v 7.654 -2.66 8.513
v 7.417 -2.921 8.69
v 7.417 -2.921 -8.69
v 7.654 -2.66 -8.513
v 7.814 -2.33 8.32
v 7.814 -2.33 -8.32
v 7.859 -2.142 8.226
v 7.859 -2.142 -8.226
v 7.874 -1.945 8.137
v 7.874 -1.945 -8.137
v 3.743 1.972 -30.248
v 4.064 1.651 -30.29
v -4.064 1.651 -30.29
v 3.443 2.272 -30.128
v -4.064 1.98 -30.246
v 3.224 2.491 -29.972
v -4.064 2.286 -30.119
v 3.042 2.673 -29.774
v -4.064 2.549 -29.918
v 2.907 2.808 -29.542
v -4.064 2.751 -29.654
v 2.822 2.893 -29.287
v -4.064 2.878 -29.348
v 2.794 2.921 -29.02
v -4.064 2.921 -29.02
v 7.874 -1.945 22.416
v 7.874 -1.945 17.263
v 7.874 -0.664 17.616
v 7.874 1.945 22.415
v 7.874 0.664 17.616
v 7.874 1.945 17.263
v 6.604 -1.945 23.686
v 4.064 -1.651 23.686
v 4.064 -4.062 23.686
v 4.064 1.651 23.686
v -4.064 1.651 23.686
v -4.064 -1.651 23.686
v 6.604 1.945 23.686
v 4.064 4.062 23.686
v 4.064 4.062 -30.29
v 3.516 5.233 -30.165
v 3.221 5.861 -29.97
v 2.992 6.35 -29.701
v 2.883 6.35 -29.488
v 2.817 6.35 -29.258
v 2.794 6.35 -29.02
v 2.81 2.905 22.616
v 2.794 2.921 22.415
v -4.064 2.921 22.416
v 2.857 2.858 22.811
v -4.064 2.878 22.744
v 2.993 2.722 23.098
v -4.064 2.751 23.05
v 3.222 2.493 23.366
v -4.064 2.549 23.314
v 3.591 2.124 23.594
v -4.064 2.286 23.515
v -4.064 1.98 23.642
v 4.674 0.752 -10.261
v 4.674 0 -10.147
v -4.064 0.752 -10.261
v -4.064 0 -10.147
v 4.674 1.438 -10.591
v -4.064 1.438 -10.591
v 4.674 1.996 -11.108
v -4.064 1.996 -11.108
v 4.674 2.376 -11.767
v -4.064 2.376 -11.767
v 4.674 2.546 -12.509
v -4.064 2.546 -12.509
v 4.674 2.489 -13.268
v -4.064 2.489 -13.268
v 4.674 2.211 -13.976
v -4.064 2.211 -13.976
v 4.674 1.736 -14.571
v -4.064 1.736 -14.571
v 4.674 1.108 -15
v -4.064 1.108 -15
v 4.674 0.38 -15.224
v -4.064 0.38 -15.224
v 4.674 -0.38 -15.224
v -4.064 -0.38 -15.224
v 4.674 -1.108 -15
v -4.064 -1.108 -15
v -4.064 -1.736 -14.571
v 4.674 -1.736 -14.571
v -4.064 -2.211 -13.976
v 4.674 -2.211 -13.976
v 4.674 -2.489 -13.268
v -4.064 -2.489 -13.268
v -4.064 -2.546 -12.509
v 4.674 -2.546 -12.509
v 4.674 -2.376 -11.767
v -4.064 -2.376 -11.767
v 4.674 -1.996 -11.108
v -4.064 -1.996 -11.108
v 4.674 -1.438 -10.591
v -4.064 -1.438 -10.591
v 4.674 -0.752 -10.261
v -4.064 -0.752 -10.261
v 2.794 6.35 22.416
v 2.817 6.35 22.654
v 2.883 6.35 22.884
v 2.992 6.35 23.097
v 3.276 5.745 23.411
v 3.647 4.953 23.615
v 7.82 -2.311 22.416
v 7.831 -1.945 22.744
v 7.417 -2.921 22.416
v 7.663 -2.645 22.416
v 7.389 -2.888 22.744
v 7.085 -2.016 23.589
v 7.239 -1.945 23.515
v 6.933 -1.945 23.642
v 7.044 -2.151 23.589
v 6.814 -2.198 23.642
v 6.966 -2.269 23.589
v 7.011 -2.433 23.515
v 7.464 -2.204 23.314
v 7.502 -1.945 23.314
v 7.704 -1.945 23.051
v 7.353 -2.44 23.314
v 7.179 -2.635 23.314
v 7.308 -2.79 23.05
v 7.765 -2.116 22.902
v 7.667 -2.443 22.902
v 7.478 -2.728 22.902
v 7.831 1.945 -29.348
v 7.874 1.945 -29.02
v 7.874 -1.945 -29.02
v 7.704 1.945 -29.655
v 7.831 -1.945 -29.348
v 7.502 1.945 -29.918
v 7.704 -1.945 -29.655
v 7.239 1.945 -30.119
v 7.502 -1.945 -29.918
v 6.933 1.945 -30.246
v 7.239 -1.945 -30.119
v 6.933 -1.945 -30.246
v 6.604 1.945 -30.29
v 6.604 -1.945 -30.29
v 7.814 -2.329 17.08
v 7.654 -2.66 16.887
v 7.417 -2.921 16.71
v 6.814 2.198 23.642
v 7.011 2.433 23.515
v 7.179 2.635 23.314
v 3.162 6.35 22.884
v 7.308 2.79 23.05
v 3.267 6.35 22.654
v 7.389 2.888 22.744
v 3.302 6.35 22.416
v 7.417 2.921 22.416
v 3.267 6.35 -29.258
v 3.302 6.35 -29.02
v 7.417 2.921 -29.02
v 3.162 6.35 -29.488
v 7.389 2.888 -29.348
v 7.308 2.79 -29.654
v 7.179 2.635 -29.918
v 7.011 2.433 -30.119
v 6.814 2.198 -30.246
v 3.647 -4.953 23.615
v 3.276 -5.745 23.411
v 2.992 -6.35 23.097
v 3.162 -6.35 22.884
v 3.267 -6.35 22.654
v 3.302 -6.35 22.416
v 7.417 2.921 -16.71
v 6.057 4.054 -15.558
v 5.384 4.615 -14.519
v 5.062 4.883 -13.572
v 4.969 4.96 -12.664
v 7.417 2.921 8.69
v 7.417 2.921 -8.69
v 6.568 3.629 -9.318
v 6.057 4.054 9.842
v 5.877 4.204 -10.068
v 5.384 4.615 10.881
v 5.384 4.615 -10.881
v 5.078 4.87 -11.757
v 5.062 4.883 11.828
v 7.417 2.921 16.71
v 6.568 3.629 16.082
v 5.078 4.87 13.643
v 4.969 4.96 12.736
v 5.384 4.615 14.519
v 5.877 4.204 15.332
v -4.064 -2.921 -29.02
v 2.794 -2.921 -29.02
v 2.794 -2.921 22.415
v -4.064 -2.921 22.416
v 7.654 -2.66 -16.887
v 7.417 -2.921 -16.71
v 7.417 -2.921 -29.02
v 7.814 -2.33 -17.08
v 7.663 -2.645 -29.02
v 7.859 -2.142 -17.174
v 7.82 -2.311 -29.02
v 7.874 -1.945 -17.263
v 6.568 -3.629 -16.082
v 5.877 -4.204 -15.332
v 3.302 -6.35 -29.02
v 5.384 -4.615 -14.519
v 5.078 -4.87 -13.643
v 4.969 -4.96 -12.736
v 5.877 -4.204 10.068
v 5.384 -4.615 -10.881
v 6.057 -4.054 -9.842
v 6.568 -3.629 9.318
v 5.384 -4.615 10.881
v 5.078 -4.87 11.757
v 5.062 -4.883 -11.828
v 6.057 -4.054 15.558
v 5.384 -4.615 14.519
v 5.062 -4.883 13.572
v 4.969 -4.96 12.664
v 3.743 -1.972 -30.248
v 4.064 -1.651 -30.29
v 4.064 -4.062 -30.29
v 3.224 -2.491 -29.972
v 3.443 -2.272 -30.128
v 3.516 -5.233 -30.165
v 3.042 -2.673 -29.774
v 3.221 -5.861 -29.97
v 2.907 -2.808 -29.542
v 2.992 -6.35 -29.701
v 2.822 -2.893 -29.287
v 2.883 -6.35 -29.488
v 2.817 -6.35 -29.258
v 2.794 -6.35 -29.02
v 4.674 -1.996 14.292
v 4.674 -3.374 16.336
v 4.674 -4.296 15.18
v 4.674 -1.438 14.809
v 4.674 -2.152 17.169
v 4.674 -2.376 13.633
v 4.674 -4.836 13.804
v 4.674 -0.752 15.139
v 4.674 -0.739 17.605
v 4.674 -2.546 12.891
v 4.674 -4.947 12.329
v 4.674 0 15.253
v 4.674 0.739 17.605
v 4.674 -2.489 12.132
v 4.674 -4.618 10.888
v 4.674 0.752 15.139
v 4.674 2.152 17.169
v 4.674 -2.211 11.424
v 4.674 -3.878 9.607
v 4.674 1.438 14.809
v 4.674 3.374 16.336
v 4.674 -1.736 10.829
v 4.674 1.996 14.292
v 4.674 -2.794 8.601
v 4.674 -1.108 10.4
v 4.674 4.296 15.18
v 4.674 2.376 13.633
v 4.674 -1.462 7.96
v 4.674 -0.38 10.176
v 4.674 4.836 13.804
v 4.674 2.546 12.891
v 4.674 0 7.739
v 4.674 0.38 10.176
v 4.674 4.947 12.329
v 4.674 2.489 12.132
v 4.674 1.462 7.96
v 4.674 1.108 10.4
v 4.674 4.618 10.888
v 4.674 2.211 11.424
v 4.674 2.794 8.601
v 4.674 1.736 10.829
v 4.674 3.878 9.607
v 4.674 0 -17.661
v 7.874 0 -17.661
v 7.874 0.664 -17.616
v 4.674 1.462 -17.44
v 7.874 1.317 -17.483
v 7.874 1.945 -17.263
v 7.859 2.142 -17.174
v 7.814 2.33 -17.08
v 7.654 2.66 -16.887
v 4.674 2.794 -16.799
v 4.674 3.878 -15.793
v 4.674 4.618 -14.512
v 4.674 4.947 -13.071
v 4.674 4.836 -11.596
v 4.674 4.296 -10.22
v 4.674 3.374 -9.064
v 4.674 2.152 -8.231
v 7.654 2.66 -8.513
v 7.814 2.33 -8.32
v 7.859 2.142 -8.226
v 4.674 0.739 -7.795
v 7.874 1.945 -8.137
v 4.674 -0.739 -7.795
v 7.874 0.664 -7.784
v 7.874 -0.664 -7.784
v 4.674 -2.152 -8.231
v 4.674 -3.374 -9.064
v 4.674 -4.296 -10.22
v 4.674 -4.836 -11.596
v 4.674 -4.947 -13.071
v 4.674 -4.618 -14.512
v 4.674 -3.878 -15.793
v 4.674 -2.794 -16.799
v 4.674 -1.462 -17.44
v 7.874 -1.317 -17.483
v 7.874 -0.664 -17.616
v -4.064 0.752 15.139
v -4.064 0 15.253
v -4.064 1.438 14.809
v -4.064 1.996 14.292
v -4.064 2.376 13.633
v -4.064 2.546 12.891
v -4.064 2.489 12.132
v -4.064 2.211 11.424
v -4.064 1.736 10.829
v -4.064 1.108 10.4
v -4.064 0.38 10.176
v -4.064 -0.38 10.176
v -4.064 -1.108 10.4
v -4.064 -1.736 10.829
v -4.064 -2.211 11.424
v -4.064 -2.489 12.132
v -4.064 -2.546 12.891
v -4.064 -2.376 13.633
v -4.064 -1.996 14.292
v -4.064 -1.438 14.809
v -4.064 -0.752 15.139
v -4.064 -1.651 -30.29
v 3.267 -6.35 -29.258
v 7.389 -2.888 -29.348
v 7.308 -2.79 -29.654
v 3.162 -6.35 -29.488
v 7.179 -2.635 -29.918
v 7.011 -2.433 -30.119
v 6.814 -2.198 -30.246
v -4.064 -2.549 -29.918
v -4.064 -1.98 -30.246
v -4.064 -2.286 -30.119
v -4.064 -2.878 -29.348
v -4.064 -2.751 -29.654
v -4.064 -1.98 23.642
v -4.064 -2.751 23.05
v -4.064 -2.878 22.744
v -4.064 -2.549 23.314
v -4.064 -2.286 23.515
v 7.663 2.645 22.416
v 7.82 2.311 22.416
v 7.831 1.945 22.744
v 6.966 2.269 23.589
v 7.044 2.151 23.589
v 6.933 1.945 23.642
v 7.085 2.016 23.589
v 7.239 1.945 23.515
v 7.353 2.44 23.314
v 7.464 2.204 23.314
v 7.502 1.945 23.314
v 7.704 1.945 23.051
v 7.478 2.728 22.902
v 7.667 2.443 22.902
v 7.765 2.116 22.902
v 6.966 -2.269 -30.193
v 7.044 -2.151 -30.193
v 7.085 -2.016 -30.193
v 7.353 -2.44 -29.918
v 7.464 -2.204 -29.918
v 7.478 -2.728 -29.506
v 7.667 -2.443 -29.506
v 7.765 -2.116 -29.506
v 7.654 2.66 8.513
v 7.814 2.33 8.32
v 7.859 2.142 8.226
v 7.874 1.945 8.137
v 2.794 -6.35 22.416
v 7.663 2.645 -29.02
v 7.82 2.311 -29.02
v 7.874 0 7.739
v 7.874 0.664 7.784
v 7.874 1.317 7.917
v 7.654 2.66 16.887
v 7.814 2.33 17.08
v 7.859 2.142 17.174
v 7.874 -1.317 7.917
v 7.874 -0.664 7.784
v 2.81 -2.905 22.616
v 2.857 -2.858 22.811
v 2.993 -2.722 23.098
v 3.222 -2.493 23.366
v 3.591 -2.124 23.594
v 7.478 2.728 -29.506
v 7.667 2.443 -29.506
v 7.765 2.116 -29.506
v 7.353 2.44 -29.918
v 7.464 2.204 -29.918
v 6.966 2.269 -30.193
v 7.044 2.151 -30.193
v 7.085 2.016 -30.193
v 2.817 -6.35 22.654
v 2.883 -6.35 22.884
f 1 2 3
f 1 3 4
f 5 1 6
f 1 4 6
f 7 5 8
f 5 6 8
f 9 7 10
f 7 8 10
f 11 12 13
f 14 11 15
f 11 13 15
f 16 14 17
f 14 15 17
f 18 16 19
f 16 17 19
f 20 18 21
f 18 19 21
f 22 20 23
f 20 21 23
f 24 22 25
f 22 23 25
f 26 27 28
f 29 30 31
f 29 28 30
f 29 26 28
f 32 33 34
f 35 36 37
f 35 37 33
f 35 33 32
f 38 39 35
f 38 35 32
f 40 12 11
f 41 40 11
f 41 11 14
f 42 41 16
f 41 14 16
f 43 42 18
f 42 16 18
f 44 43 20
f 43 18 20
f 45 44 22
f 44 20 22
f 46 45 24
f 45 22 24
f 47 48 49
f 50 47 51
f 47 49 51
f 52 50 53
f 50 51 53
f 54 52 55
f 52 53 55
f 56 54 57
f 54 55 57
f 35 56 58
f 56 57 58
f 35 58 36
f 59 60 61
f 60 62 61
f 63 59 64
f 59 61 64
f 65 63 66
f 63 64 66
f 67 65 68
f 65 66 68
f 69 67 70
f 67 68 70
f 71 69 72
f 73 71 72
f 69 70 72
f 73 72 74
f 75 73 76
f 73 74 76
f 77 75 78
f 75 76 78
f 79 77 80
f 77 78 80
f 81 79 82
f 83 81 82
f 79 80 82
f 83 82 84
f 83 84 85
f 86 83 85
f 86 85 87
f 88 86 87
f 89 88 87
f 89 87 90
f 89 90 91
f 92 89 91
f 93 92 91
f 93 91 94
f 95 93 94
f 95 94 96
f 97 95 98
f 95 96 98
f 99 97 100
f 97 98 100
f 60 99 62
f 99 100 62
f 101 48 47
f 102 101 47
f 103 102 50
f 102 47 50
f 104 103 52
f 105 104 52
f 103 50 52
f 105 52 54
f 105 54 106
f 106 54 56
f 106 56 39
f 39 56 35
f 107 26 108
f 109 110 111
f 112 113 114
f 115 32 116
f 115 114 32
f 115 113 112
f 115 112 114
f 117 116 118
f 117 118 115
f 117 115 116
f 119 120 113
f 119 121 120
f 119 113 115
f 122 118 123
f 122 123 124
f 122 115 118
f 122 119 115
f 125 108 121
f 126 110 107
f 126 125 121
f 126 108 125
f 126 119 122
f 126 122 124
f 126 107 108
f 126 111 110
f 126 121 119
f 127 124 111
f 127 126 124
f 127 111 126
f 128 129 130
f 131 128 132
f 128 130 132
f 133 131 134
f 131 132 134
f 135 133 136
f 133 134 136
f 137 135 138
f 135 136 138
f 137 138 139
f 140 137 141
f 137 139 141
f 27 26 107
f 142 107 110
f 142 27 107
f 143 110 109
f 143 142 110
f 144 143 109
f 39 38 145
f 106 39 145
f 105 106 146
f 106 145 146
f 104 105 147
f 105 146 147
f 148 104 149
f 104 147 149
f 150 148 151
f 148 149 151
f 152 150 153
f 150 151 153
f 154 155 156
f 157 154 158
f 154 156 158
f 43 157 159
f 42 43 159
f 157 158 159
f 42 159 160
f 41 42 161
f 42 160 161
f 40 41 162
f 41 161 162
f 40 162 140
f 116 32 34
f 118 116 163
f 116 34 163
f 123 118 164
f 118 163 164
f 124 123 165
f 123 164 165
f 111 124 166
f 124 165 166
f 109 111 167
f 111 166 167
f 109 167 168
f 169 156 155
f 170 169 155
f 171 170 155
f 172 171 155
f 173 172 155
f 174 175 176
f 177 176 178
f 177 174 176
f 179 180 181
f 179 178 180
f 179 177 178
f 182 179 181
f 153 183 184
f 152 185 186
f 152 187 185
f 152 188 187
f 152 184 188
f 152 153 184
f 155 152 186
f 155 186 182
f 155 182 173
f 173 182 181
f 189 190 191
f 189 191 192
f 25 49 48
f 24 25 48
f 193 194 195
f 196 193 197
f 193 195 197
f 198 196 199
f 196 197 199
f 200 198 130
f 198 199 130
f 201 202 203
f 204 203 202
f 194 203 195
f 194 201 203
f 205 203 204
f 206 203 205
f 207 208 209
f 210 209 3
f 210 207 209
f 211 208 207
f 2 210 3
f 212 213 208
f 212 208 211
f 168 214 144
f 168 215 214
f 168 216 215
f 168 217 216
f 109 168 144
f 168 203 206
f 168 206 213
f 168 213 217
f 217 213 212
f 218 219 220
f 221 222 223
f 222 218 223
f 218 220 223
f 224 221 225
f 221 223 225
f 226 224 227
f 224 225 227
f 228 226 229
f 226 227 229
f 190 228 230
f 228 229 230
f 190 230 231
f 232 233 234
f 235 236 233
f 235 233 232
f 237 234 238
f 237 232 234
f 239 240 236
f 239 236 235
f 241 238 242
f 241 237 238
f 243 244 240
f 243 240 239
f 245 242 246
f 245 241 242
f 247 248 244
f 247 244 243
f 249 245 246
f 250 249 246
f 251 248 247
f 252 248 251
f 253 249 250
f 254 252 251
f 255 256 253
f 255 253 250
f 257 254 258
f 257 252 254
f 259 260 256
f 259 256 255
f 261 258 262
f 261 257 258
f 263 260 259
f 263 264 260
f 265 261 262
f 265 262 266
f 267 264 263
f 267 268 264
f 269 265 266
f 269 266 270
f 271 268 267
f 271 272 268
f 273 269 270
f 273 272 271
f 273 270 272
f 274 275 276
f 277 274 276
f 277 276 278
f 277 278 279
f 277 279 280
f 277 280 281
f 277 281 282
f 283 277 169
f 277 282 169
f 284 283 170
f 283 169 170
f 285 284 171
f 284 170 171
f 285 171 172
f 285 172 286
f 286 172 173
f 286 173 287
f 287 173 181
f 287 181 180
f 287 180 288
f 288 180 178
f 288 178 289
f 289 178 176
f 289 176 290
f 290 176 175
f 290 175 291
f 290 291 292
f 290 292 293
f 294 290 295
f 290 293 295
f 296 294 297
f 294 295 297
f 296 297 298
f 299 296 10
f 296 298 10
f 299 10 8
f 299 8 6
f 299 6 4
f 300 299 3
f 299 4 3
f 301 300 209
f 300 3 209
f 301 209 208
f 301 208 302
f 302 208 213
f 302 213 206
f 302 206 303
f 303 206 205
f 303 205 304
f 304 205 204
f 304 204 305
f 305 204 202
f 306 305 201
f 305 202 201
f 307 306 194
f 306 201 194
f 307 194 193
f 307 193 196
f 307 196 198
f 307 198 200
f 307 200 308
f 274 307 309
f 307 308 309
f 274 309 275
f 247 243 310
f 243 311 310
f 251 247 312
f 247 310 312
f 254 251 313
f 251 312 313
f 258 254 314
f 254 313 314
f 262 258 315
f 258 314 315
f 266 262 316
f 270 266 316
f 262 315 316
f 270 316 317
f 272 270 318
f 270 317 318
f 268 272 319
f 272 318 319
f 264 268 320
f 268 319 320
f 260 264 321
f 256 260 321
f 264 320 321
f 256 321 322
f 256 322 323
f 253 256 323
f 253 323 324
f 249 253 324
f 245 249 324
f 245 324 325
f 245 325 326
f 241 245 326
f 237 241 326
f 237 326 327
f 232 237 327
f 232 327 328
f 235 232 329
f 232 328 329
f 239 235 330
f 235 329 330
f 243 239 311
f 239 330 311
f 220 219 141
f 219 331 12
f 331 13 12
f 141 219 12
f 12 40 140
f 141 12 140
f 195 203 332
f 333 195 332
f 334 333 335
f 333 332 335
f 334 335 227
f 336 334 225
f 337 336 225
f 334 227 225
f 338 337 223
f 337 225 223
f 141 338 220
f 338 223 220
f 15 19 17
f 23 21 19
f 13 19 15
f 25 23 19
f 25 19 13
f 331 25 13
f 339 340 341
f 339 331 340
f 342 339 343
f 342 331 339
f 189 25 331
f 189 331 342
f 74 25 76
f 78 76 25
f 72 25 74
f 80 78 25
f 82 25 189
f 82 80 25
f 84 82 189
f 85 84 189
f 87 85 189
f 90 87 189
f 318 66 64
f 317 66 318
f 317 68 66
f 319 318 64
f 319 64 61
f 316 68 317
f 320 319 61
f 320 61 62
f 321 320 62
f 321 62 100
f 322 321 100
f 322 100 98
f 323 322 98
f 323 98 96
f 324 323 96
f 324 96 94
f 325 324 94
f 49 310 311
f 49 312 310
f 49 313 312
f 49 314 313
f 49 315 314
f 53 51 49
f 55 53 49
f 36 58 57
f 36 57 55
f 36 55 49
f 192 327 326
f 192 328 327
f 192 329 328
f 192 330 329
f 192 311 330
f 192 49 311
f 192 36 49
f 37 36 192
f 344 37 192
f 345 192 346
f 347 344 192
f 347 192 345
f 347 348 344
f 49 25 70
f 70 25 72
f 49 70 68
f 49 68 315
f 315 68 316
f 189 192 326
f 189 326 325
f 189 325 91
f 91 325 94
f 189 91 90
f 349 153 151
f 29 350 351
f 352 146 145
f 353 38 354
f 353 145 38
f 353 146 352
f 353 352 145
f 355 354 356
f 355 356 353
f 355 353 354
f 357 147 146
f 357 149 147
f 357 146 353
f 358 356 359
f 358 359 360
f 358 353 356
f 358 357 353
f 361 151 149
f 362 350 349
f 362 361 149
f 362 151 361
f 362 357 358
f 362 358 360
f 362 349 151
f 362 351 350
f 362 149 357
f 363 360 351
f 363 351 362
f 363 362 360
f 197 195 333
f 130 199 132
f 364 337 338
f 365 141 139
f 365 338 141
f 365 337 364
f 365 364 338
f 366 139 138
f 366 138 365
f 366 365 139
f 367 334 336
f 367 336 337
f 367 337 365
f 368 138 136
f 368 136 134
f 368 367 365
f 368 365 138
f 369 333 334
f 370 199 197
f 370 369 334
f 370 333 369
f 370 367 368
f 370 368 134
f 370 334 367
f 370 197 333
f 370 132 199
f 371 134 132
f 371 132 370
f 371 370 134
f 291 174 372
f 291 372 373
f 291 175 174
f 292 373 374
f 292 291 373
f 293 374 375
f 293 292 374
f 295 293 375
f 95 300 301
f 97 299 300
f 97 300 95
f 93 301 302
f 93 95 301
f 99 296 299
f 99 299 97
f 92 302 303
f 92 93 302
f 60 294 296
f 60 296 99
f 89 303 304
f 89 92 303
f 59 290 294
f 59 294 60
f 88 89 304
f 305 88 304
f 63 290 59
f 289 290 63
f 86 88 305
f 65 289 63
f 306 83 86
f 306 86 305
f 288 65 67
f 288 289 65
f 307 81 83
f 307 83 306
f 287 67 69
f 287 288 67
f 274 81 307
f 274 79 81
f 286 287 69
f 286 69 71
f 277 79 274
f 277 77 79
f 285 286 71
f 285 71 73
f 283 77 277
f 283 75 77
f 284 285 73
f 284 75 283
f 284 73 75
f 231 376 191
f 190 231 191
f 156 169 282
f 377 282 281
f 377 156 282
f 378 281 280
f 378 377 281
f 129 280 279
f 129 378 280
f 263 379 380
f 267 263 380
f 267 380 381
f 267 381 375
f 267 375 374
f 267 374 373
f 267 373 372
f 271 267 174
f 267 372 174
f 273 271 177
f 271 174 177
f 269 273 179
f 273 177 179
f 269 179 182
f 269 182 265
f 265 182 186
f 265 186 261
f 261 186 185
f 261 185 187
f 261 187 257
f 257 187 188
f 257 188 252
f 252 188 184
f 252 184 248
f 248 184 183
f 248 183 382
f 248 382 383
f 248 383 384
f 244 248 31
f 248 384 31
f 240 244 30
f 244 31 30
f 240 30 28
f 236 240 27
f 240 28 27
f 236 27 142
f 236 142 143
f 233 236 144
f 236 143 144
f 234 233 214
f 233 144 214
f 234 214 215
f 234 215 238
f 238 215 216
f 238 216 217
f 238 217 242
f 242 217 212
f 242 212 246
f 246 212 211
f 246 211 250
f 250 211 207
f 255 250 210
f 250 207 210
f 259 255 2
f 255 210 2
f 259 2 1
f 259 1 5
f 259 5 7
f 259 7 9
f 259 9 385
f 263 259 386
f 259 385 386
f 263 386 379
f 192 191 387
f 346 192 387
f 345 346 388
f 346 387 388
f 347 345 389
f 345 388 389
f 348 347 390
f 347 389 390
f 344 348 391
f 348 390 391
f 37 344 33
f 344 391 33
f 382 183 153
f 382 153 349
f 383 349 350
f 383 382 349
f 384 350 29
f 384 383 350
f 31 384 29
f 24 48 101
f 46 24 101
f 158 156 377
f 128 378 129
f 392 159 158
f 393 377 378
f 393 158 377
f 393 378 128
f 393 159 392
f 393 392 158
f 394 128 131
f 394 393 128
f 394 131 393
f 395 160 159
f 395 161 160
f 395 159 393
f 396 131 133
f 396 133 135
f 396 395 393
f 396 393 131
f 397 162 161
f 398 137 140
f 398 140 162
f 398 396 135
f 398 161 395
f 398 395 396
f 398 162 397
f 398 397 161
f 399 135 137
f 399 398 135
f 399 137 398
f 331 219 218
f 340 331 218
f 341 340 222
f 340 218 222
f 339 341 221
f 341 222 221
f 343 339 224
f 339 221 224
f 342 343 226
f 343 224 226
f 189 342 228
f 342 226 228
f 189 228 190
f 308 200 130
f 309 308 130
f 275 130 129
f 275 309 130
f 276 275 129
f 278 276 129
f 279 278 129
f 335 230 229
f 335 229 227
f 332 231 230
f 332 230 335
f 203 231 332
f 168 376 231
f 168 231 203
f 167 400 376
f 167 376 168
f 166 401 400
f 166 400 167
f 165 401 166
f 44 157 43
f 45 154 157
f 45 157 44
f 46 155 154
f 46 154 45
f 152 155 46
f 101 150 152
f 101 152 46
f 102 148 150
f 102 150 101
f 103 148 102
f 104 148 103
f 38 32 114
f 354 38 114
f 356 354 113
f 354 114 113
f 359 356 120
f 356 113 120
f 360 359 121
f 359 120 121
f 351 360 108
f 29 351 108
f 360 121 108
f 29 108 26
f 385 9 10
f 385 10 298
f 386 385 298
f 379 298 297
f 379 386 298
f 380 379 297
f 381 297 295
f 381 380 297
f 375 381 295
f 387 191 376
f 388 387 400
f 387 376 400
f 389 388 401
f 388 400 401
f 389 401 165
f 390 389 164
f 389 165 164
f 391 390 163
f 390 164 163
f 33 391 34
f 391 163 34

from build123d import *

# Parameters (mm, degrees)
BOSS_EXTRUDE1_DEPTH                             = 53.975
SKETCH2_W                                       = 6.858
SKETCH2_H                                       = 3.429
CUT_EXTRUDE1_DEPTH                              = 55.91468839
SKETCH4_W                                       = 6.858
SKETCH4_H                                       = 3.429
CUT_EXTRUDE2_DEPTH                              = 55.91468839
F_3_CLEARANCE_HOLE1_D                           = 2.7686
CBORE_FOR_10_BUTTON_HEAD_CAP_SCREW1_D           = 5.1054
CBORE_FOR_10_BUTTON_HEAD_CAP_SCREW1_CBORE_D     = 9.92124
CBORE_FOR_10_BUTTON_HEAD_CAP_SCREW1_CBORE_DEPTH = 3.2004
FILLET1_R                                       = 1.27
FILLET3_R                                       = 1.27
FILLET5_R                                       = 1.27


with BuildPart() as part:
    # Sketch1 → Boss-Extrude1 (new body)
    with BuildSketch(Plane.XY.offset(23.6855)):
        Polygon((3.302, 6.35), (-4.064, 6.35), (-4.064, -6.35), (3.302, -6.35), (7.874, -2.54), (7.874, 2.54), align=None)
    extrude(amount=-BOSS_EXTRUDE1_DEPTH)

    # Sketch2 → Cut-Extrude1 (cut, through all)
    with BuildSketch(Plane.XY.offset(23.6855)):
        with Locations((-0.635, 4.6355)):
            Rectangle(SKETCH2_W, SKETCH2_H)
    extrude(amount=-CUT_EXTRUDE1_DEPTH, mode=Mode.SUBTRACT)

    # Sketch4 → Cut-Extrude2 (cut, through all)
    with BuildSketch(Plane.XY.offset(23.6855)):
        with Locations((-0.635, -4.6355)):
            Rectangle(SKETCH4_W, SKETCH4_H)
    extrude(amount=-CUT_EXTRUDE2_DEPTH, mode=Mode.SUBTRACT)

    # #3 Clearance Hole1 (through all)
    with Locations(Plane.ZY.offset(4.064)):
        with Locations((12.7, 0), (-12.7, 0)):
            Hole(F_3_CLEARANCE_HOLE1_D / 2)

    # CBORE for #10 Button Head Cap Screw1 (through all)
    with Locations(Plane(origin=(7.874, 0, 0), x_dir=(0, 0, -1), z_dir=(1, 0, 0))):
        with Locations((-12.7, 0), (12.7, 0)):
            CounterBoreHole(CBORE_FOR_10_BUTTON_HEAD_CAP_SCREW1_D / 2, CBORE_FOR_10_BUTTON_HEAD_CAP_SCREW1_CBORE_D / 2, CBORE_FOR_10_BUTTON_HEAD_CAP_SCREW1_CBORE_DEPTH)

    # Fillet1
    fillet1_edges = [part.edges().sort_by_distance(p)[0] for p in [
        (7.874, -2.54, 20.323251747),
        (7.874, -2.54, -23.625251747),
        (7.874, -2.54, 0),
        (7.874, 2.54, 20.323251747),
        (7.874, 2.54, 0),
        (7.874, 2.54, -23.625251747),
    ]]
    fillet(fillet1_edges, radius=FILLET1_R)

    # Fillet3
    # the kernel refuses this fillet: 1.27 mm, written as the material it takes off along each edge
    with BuildSketch(Plane(origin=(0.862897437, -8.382585469, -30.2895), x_dir=(0, 0, 1), z_dir=(0.7682212795973759, 0.6401843996644799, 0)), Plane(origin=(7.417034188, 2.920804844, -30.2895), x_dir=(0, 0, 1), z_dir=(-0.7682212795973759, 0.6401843996644799, 0))) as fillet3_piece_1:
        with BuildLine():
            CenterArc((FILLET3_R, -FILLET3_R), FILLET3_R, 90, 90)
            Line((0, -FILLET3_R), (0, 0))
            Line((0, 0), (FILLET3_R, 0))
        make_face()
    extrude(amount=8.531574072, mode=Mode.SUBTRACT)
    with BuildSketch(Plane(origin=(6.604, -1.945163819, -30.2895), x_dir=(0.6401843996644796, -0.7682212795973762, 0), z_dir=(-0.7682212795973762, -0.6401843996644796, 0))) as fillet3_piece_2:
        with BuildLine():
            CenterArc((1.27 - FILLET3_R, FILLET3_R), FILLET3_R, 270, 90)
            Line((1.27, FILLET3_R), (1.27, 0))
            Line((1.27, 0), (1.27 - FILLET3_R, 0))
        make_face()
    revolve(axis=Axis((6.604, -1.945163819, -30.2895), (0, 0, 1)), revolution_arc=50.194428908, mode=Mode.SUBTRACT)
    with BuildSketch(Plane(origin=(6.604, 1.945163819, -30.2895), x_dir=(0.6401843996644799, 0.7682212795973757, 0), z_dir=(-0.7682212795973757, 0.6401843996644799, 0))) as fillet3_piece_3:
        with BuildLine():
            CenterArc((1.27 - FILLET3_R, -FILLET3_R), FILLET3_R, 0, 90)
            Line((1.27, -FILLET3_R), (1.27, 0))
            Line((1.27, 0), (1.27 - FILLET3_R, 0))
        make_face()
    revolve(axis=Axis((6.604, 1.945163819, -30.2895), (0, 0, -1)), revolution_arc=50.194428908, mode=Mode.SUBTRACT)
    with BuildSketch(Plane(origin=(2.794, -2.921, -30.2895), x_dir=(0, 0, 1), z_dir=(-1, 0, 0)), Plane(origin=(-7.239, 2.921, -30.2895), x_dir=(0, 0, 1), z_dir=(1, 0, 0))) as fillet3_piece_4:
        with BuildLine():
            CenterArc((FILLET3_R, FILLET3_R), FILLET3_R, 180, 90)
            Line((0, FILLET3_R), (0, 0))
            Line((0, 0), (FILLET3_R, 0))
        make_face()
    extrude(amount=10.033, mode=Mode.SUBTRACT)
    with BuildSketch(Plane(origin=(2.794, 2.921, -30.2895), x_dir=(0, 0, 1), z_dir=(0, 1, 0)), Plane(origin=(2.794, -9.525, -30.2895), x_dir=(0, 0, 1), z_dir=(0, 1, 0))) as fillet3_piece_5:
        with BuildLine():
            CenterArc((FILLET3_R, FILLET3_R), FILLET3_R, 180, 90)
            Line((0, FILLET3_R), (0, 0))
            Line((0, 0), (FILLET3_R, 0))
        make_face()
    extrude(amount=6.604, mode=Mode.SUBTRACT)
    with BuildSketch(Plane(origin=(7.874, -1.945163819, -30.2895), x_dir=(-1, 0, 0), z_dir=(0, 1, 0))) as fillet3_piece_6:
        with BuildLine():
            CenterArc((FILLET3_R, FILLET3_R), FILLET3_R, 180, 90)
            Line((0, FILLET3_R), (0, 0))
            Line((0, 0), (FILLET3_R, 0))
        make_face()
    extrude(amount=3.890327637, mode=Mode.SUBTRACT)
    with BuildSketch(Plane(origin=(2.794, -9.525, -30.2895), x_dir=(0, 0, 1), z_dir=(0, 1, 0))) as fillet3_piece_7a_section:
        with BuildLine():
            CenterArc((FILLET3_R, FILLET3_R), FILLET3_R, 180, 90)
            Line((0, FILLET3_R), (0, 0))
            Line((0, 0), (FILLET3_R, 0))
        make_face()
    fillet3_piece_7a = extrude(amount=9.779, mode=Mode.PRIVATE)
    fillet3_piece_7a = split(fillet3_piece_7a, bisect_by=Plane(origin=(3.081521795, -2.921, -30.001978205), z_dir=(0, 1, 0)), keep=Keep.TOP, mode=Mode.PRIVATE)
    with BuildSketch(Plane(origin=(5.969, -2.921, -30.2895), x_dir=(0, 0, 1), z_dir=(-1, 0, 0))) as fillet3_piece_7b_section:
        with BuildLine():
            CenterArc((FILLET3_R, FILLET3_R), FILLET3_R, 180, 90)
            Line((0, FILLET3_R), (0, 0))
            Line((0, 0), (FILLET3_R, 0))
        make_face()
    fillet3_piece_7b = extrude(amount=13.208, mode=Mode.PRIVATE)
    fillet3_piece_7b = split(fillet3_piece_7b, bisect_by=Plane(origin=(2.794, -2.633478205, -30.001978205), z_dir=(1, 0, 0)), keep=Keep.TOP, mode=Mode.PRIVATE)
    fillet3_piece_7 = fillet3_piece_7a & fillet3_piece_7b
    add(fillet3_piece_7, mode=Mode.SUBTRACT)
    with BuildSketch(Plane(origin=(2.794, -0.254, -30.2895), x_dir=(0, 0, 1), z_dir=(0, 1, 0))) as fillet3_piece_8a_section:
        with BuildLine():
            CenterArc((FILLET3_R, FILLET3_R), FILLET3_R, 180, 90)
            Line((0, FILLET3_R), (0, 0))
            Line((0, 0), (FILLET3_R, 0))
        make_face()
    fillet3_piece_8a = extrude(amount=9.779, mode=Mode.PRIVATE)
    fillet3_piece_8a = split(fillet3_piece_8a, bisect_by=Plane(origin=(3.081521795, 2.921, -30.001978205), z_dir=(0, -1, 0)), keep=Keep.TOP, mode=Mode.PRIVATE)
    with BuildSketch(Plane(origin=(-7.239, 2.921, -30.2895), x_dir=(0, 0, 1), z_dir=(1, 0, 0))) as fillet3_piece_8b_section:
        with BuildLine():
            CenterArc((FILLET3_R, FILLET3_R), FILLET3_R, 180, 90)
            Line((0, FILLET3_R), (0, 0))
            Line((0, 0), (FILLET3_R, 0))
        make_face()
    fillet3_piece_8b = extrude(amount=13.208, mode=Mode.PRIVATE)
    fillet3_piece_8b = split(fillet3_piece_8b, bisect_by=Plane(origin=(2.794, 2.633478205, -30.001978205), z_dir=(1, 0, 0)), keep=Keep.TOP, mode=Mode.PRIVATE)
    fillet3_piece_8 = fillet3_piece_8a & fillet3_piece_8b
    add(fillet3_piece_8, mode=Mode.SUBTRACT)

    # Fillet5
    # the kernel refuses this fillet: 1.27 mm, written as the material it takes off along each edge
    with BuildSketch(Plane(origin=(0.862897437, -8.382585469, 23.6855), x_dir=(-0.6401843996644799, 0.7682212795973759, 0), z_dir=(0.7682212795973759, 0.6401843996644799, 0)), Plane(origin=(7.417034188, 2.920804844, 23.6855), x_dir=(-0.6401843996644799, -0.7682212795973759, 0), z_dir=(-0.7682212795973759, 0.6401843996644799, 0))) as fillet5_piece_1:
        with BuildLine():
            CenterArc((FILLET5_R, -FILLET5_R), FILLET5_R, 90, 90)
            Line((0, -FILLET5_R), (0, 0))
            Line((0, 0), (FILLET5_R, 0))
        make_face()
    extrude(amount=8.531574072, mode=Mode.SUBTRACT)
    with BuildSketch(Plane(origin=(6.604, -1.945163819, 23.6855), x_dir=(1, 0, 0), z_dir=(0, 1, 0))) as fillet5_piece_2:
        with BuildLine():
            CenterArc((1.27 - FILLET5_R, FILLET5_R), FILLET5_R, 270, 90)
            Line((1.27, FILLET5_R), (1.27, 0))
            Line((1.27, 0), (1.27 - FILLET5_R, 0))
        make_face()
    revolve(axis=Axis((6.604, -1.945163819, 23.6855), (0, 0, -1)), revolution_arc=50.194428908, mode=Mode.SUBTRACT)
    with BuildSketch(Plane(origin=(6.604, 1.945163819, 23.6855), x_dir=(0.6401843996644799, 0.7682212795973757, 0), z_dir=(-0.7682212795973757, 0.6401843996644799, 0))) as fillet5_piece_3:
        with BuildLine():
            CenterArc((1.27 - FILLET5_R, FILLET5_R), FILLET5_R, 270, 90)
            Line((1.27, FILLET5_R), (1.27, 0))
            Line((1.27, 0), (1.27 - FILLET5_R, 0))
        make_face()
    revolve(axis=Axis((6.604, 1.945163819, 23.6855), (0, 0, -1)), revolution_arc=50.194428908, mode=Mode.SUBTRACT)
    with BuildSketch(Plane(origin=(2.794, 2.921, 23.6855), x_dir=(1, 0, 0), z_dir=(0, 1, 0)), Plane(origin=(2.794, -9.525, 23.6855), x_dir=(1, 0, 0), z_dir=(0, 1, 0))) as fillet5_piece_4:
        with BuildLine():
            CenterArc((FILLET5_R, FILLET5_R), FILLET5_R, 180, 90)
            Line((0, FILLET5_R), (0, 0))
            Line((0, 0), (FILLET5_R, 0))
        make_face()
    extrude(amount=6.604, mode=Mode.SUBTRACT)
    with BuildSketch(Plane(origin=(-7.239, 2.921, 23.6855), x_dir=(0, -1, 0), z_dir=(1, 0, 0)), Plane(origin=(2.794, -2.921, 23.6855), x_dir=(0, 1, 0), z_dir=(-1, 0, 0))) as fillet5_piece_5:
        with BuildLine():
            CenterArc((FILLET5_R, FILLET5_R), FILLET5_R, 180, 90)
            Line((0, FILLET5_R), (0, 0))
            Line((0, 0), (FILLET5_R, 0))
        make_face()
    extrude(amount=10.033, mode=Mode.SUBTRACT)
    with BuildSketch(Plane(origin=(7.874, -1.945163819, 23.6855), x_dir=(-1, 0, 0), z_dir=(0, 1, 0))) as fillet5_piece_6:
        with BuildLine():
            CenterArc((FILLET5_R, -FILLET5_R), FILLET5_R, 90, 90)
            Line((0, -FILLET5_R), (0, 0))
            Line((0, 0), (FILLET5_R, 0))
        make_face()
    extrude(amount=3.890327637, mode=Mode.SUBTRACT)
    with BuildSketch(Plane(origin=(2.794, -0.254, 23.6855), x_dir=(1, 0, 0), z_dir=(0, 1, 0))) as fillet5_piece_7a_section:
        with BuildLine():
            CenterArc((FILLET5_R, FILLET5_R), FILLET5_R, 180, 90)
            Line((0, FILLET5_R), (0, 0))
            Line((0, 0), (FILLET5_R, 0))
        make_face()
    fillet5_piece_7a = extrude(amount=9.779, mode=Mode.PRIVATE)
    fillet5_piece_7a = split(fillet5_piece_7a, bisect_by=Plane(origin=(3.081521795, 2.921, 23.397978205), z_dir=(0, -1, 0)), keep=Keep.TOP, mode=Mode.PRIVATE)
    with BuildSketch(Plane(origin=(-7.239, 2.921, 23.6855), x_dir=(0, -1, 0), z_dir=(1, 0, 0))) as fillet5_piece_7b_section:
        with BuildLine():
            CenterArc((FILLET5_R, FILLET5_R), FILLET5_R, 180, 90)
            Line((0, FILLET5_R), (0, 0))
            Line((0, 0), (FILLET5_R, 0))
        make_face()
    fillet5_piece_7b = extrude(amount=13.208, mode=Mode.PRIVATE)
    fillet5_piece_7b = split(fillet5_piece_7b, bisect_by=Plane(origin=(2.794, 2.633478205, 23.397978205), z_dir=(1, 0, 0)), keep=Keep.TOP, mode=Mode.PRIVATE)
    fillet5_piece_7 = fillet5_piece_7a & fillet5_piece_7b
    add(fillet5_piece_7, mode=Mode.SUBTRACT)
    with BuildSketch(Plane(origin=(2.794, -9.525, 23.6855), x_dir=(1, 0, 0), z_dir=(0, 1, 0))) as fillet5_piece_8a_section:
        with BuildLine():
            CenterArc((FILLET5_R, FILLET5_R), FILLET5_R, 180, 90)
            Line((0, FILLET5_R), (0, 0))
            Line((0, 0), (FILLET5_R, 0))
        make_face()
    fillet5_piece_8a = extrude(amount=9.779, mode=Mode.PRIVATE)
    fillet5_piece_8a = split(fillet5_piece_8a, bisect_by=Plane(origin=(3.081521795, -2.921, 23.397978205), z_dir=(0, 1, 0)), keep=Keep.TOP, mode=Mode.PRIVATE)
    with BuildSketch(Plane(origin=(5.969, -2.921, 23.6855), x_dir=(0, 1, 0), z_dir=(-1, 0, 0))) as fillet5_piece_8b_section:
        with BuildLine():
            CenterArc((FILLET5_R, FILLET5_R), FILLET5_R, 180, 90)
            Line((0, FILLET5_R), (0, 0))
            Line((0, 0), (FILLET5_R, 0))
        make_face()
    fillet5_piece_8b = extrude(amount=13.208, mode=Mode.PRIVATE)
    fillet5_piece_8b = split(fillet5_piece_8b, bisect_by=Plane(origin=(2.794, -2.633478205, 23.397978205), z_dir=(1, 0, 0)), keep=Keep.TOP, mode=Mode.PRIVATE)
    fillet5_piece_8 = fillet5_piece_8a & fillet5_piece_8b
    add(fillet5_piece_8, mode=Mode.SUBTRACT)


solid = part.part
